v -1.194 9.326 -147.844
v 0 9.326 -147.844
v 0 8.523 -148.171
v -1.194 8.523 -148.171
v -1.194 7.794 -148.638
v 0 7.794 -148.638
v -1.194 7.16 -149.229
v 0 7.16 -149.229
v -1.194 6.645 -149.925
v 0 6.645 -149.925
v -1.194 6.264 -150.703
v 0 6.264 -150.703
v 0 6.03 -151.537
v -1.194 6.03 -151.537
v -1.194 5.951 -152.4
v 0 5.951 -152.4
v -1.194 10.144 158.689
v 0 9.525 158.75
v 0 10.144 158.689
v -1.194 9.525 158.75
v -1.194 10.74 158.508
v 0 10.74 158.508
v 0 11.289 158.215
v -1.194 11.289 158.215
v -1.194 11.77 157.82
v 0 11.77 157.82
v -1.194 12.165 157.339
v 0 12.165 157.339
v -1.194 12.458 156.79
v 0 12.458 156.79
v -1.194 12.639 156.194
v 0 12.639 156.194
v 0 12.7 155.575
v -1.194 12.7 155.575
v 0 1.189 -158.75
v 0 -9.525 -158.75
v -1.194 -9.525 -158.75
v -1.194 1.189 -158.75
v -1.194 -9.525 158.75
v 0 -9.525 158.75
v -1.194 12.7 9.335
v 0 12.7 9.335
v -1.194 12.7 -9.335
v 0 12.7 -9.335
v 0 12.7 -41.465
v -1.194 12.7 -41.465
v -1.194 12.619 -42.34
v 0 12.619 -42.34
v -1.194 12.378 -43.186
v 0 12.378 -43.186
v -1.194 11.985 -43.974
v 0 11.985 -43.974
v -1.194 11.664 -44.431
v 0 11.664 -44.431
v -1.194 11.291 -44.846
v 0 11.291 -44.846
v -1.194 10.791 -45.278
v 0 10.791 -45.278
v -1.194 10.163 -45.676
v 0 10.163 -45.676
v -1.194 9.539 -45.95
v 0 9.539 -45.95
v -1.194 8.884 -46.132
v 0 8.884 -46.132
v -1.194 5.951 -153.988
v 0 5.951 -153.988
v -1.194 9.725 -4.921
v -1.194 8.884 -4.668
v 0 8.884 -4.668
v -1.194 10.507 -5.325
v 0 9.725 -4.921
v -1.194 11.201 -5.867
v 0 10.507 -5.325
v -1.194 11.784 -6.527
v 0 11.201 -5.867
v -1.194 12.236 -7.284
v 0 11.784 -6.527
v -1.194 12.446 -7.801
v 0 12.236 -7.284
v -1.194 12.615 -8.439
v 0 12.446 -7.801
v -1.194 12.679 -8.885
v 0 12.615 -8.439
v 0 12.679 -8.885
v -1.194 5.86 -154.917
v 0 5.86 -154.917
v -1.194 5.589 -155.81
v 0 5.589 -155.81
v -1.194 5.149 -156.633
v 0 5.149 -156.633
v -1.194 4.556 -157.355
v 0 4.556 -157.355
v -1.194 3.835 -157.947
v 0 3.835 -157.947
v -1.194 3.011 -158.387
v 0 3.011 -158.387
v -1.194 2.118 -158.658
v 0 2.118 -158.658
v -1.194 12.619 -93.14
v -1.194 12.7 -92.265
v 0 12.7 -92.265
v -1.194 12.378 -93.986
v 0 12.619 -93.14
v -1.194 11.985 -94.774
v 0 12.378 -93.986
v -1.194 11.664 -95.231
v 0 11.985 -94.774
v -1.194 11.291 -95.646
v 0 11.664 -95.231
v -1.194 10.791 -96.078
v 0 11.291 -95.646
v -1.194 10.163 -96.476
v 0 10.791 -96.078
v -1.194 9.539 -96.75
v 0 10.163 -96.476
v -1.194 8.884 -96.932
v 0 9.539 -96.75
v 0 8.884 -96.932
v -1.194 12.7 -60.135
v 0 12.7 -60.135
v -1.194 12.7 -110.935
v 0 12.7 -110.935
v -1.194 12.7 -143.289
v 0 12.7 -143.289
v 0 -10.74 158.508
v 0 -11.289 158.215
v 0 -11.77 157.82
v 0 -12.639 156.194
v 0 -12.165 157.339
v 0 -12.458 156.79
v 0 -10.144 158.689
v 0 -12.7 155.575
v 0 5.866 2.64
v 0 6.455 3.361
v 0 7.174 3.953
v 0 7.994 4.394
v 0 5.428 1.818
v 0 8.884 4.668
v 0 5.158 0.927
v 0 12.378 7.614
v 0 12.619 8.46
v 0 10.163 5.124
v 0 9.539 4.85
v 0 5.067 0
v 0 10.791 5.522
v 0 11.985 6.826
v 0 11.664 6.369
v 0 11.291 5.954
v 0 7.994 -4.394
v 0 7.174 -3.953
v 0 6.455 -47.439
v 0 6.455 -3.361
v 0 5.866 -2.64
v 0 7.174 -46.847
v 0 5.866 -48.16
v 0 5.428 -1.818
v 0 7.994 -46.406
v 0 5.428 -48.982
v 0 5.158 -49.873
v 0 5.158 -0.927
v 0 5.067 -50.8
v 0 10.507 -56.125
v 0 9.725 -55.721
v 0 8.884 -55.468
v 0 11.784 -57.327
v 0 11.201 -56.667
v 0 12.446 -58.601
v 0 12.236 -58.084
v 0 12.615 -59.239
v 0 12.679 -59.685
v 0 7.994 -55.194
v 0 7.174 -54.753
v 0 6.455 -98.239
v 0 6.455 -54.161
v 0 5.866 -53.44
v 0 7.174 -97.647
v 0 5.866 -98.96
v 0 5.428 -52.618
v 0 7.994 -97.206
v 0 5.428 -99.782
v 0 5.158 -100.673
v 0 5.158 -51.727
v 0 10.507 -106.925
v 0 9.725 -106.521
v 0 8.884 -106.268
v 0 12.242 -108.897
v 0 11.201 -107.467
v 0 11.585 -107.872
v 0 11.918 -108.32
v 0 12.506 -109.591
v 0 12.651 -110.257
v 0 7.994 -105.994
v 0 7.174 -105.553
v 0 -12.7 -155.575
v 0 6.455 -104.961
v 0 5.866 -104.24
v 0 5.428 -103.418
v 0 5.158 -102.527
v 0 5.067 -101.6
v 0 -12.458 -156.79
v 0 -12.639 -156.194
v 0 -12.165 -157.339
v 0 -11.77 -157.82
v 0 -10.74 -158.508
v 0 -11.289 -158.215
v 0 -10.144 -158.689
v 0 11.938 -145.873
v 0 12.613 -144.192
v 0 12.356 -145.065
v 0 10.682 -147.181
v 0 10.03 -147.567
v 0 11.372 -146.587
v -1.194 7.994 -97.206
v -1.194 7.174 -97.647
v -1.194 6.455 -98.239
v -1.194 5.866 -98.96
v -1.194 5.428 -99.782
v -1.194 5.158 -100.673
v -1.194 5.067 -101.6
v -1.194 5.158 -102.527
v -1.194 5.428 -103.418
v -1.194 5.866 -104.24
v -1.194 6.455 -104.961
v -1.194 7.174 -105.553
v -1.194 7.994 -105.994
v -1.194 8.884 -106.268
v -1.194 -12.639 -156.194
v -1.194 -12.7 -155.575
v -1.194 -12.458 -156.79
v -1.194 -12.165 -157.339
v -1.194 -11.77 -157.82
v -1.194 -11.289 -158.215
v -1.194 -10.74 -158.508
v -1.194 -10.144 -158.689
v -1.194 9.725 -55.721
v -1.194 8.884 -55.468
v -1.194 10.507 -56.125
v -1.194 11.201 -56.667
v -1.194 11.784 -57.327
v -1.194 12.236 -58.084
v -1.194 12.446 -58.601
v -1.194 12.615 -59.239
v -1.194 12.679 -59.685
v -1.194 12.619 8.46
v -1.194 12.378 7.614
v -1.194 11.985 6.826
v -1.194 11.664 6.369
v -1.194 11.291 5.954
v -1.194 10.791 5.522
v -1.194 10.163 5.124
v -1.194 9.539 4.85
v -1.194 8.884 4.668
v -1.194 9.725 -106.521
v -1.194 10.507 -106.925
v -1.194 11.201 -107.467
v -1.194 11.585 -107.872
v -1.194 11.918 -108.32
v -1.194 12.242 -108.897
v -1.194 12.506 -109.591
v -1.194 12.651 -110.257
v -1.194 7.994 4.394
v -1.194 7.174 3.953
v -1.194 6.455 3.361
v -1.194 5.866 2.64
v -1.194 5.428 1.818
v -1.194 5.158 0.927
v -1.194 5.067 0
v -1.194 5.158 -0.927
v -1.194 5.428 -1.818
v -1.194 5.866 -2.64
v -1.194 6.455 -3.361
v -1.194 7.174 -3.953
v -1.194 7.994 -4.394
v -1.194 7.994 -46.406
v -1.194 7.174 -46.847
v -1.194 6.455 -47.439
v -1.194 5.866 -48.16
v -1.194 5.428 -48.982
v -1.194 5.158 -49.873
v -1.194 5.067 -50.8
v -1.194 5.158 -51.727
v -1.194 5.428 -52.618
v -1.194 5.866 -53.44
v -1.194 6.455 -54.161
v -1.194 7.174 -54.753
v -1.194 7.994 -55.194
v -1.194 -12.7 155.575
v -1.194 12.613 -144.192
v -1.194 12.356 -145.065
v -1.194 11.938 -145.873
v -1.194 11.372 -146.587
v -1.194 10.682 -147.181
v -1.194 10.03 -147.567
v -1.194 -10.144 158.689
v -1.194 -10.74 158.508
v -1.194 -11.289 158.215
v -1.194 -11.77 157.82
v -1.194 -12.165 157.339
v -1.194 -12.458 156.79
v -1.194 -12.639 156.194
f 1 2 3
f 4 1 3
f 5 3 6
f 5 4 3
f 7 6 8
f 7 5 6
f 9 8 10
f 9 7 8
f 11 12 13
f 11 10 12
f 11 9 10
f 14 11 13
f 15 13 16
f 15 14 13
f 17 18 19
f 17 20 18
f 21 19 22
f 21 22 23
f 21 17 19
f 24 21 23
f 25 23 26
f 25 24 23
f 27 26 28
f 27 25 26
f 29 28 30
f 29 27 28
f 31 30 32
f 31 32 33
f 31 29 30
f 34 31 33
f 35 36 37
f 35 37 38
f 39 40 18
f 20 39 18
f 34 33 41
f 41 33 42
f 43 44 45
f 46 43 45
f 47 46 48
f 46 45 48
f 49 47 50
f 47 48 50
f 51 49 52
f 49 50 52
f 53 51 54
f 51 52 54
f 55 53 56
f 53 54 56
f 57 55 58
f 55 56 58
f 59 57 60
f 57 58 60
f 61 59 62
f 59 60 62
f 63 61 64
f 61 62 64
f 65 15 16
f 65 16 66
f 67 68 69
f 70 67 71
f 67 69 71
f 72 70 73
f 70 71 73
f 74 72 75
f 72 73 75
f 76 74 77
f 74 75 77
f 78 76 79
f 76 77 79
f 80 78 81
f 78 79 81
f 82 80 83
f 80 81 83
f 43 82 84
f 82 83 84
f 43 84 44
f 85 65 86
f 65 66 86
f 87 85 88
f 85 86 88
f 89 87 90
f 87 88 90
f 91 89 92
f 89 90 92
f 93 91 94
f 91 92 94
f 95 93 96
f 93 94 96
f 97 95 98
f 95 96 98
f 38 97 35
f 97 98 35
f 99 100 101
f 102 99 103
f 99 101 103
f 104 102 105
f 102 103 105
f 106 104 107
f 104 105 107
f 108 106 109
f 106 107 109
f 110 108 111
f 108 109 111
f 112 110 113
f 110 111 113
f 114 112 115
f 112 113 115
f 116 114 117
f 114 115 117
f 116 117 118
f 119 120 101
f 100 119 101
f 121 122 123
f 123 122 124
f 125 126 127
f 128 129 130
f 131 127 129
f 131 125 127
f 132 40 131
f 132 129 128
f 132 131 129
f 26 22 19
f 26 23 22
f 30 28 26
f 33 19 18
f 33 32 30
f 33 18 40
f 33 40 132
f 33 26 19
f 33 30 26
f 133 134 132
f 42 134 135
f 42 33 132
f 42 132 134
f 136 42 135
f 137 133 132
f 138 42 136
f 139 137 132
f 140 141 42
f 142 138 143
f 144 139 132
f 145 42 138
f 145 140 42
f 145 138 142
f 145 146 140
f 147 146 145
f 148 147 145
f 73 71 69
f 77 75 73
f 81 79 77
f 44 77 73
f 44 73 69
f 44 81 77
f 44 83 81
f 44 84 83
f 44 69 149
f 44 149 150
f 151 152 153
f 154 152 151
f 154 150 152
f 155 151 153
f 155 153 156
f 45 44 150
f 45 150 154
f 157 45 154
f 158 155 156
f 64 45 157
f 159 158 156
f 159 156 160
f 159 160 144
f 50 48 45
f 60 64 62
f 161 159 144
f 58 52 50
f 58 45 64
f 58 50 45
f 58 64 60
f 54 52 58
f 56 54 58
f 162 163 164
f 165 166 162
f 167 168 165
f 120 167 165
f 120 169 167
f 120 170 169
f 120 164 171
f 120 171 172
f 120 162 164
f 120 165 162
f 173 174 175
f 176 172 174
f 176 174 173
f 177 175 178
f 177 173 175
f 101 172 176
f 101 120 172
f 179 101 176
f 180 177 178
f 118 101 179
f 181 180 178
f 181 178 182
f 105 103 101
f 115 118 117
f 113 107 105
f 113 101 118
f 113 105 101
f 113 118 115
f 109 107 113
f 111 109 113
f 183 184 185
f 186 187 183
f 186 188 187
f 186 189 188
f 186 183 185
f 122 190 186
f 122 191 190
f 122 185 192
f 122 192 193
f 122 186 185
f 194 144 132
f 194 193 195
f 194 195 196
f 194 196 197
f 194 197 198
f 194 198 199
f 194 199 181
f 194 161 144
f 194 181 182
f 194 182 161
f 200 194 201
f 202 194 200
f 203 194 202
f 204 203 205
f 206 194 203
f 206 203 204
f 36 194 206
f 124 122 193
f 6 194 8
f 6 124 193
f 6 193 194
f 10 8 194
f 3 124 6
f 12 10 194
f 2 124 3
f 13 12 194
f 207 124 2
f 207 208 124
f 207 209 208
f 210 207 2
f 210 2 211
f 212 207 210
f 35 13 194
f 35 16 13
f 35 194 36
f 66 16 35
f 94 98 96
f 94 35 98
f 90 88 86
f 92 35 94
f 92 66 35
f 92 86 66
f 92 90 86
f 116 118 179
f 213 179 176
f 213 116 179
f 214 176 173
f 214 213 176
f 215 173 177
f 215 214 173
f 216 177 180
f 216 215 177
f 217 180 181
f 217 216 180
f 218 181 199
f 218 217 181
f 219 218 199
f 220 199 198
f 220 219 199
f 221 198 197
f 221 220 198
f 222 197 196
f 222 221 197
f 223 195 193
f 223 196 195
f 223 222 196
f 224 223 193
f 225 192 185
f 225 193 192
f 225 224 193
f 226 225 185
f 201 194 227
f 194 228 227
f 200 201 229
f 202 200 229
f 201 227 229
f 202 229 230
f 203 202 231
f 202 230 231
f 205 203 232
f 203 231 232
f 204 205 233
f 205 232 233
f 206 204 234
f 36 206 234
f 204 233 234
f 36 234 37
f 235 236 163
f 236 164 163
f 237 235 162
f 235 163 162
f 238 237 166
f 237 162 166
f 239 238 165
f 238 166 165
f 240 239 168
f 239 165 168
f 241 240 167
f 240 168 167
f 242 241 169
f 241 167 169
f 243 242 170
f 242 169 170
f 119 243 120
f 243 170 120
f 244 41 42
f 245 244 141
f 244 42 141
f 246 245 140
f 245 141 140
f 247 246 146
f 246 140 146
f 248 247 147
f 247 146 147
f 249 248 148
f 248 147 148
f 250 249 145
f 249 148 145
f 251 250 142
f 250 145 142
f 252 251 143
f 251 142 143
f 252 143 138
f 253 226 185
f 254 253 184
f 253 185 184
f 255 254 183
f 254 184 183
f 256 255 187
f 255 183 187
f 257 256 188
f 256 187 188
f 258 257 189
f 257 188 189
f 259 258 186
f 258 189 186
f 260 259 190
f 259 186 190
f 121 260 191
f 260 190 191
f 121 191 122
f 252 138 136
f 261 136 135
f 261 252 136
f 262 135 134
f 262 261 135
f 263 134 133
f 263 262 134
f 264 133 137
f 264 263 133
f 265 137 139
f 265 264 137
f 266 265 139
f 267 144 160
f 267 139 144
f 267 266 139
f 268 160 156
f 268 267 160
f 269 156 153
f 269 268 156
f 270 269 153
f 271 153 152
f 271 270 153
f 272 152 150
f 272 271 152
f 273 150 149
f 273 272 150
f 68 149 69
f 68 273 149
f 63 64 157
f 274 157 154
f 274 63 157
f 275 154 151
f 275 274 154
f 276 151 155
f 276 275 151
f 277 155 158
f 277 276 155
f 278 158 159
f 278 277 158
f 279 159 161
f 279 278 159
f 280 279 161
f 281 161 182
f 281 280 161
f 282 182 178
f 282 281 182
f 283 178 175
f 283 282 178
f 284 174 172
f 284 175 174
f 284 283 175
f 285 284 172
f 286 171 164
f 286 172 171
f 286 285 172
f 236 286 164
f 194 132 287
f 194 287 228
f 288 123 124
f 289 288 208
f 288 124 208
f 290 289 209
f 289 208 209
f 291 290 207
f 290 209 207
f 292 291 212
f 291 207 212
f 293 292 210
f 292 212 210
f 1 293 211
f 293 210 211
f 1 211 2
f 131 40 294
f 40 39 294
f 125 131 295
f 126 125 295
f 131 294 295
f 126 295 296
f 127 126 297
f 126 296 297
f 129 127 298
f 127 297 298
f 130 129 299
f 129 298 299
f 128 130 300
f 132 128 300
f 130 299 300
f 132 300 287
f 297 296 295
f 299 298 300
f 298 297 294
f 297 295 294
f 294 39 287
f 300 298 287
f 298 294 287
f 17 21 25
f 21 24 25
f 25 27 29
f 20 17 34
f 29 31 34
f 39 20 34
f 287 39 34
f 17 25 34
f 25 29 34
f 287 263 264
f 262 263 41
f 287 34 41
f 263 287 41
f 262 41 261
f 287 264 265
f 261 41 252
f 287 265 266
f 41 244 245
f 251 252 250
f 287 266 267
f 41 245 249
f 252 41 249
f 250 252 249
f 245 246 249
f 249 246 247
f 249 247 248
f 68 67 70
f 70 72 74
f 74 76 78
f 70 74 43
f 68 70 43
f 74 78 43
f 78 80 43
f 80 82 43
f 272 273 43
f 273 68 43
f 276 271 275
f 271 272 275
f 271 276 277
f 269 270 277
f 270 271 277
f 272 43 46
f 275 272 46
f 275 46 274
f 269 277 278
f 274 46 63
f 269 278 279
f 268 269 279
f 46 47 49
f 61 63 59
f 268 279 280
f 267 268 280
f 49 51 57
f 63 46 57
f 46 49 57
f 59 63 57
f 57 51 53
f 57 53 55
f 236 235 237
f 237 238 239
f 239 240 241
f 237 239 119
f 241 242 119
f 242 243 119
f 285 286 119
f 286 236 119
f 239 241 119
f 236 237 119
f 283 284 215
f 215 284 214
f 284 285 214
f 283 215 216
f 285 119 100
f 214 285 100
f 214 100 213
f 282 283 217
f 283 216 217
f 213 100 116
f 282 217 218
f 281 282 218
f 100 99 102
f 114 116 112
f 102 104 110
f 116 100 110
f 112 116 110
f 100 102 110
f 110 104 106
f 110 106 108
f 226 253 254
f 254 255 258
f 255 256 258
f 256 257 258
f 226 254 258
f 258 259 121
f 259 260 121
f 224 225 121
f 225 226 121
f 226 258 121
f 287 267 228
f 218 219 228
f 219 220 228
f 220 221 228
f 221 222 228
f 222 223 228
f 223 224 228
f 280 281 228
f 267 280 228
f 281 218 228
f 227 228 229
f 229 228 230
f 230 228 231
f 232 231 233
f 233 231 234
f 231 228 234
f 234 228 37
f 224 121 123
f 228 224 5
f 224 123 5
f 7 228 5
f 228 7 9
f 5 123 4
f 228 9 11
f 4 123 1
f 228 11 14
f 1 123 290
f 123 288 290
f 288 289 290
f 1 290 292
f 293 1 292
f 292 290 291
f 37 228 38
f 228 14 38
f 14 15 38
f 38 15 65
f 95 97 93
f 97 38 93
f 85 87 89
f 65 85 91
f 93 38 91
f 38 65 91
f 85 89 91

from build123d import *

# Parameters (mm, degrees)
SKETCH1_W              = 317.5
SKETCH1_H              = 25.4
BASE_FLANGE1_DEPTH     = 1.1938
FILLET1_R              = 3.175
CUT_EXTRUDE1_DEPTH     = 160.261664121
FILLET2_R              = 4.7625
LPATTERN2_COUNT        = 3
LPATTERN2_PITCH        = 50.8
FILLET2_OF_LPATTERN2_R = 4.7625
CUT_EXTRUDE2_DEPTH     = 160.261664229
FILLET3_R              = 4.7625


# Sheet-metal steps are written as plain solids
with BuildPart() as part:
    # Sketch1 → Base-Flange1 (new body)
    with BuildSketch(Plane(origin=(0, 0, 0), x_dir=(0, 0, -1), z_dir=(1, 0, 0))):
        Rectangle(SKETCH1_W, SKETCH1_H)
    extrude(amount=-BASE_FLANGE1_DEPTH)

    # Fillet1
    fillet1_edges = [part.edges().sort_by_distance(p)[0] for p in [
        (-0.5969, -12.7, -158.75),
        (-0.5969, -12.7, 158.75),
        (-0.5969, 12.7, 158.75),
        (-0.5969, 12.7, -158.75),
    ]]
    fillet(fillet1_edges, radius=FILLET1_R)

    # Sketch2 → Cut-Extrude1 (cut, through all)
    with BuildSketch(Plane.ZY.offset(1.1938)):
        with BuildLine():
            Line((-4.7625, 9.8298), (-4.7625, 12.7))
            Line((-4.7625, 12.7), (4.7625, 12.7))
            Line((4.7625, 12.7), (4.7625, 9.8298))
            ThreePointArc((4.7625, 9.8298), (0, 5.0673), (-4.7625, 9.8298))
        make_face()
    cut_extrude1 = extrude(amount=-CUT_EXTRUDE1_DEPTH, mode=Mode.SUBTRACT)

    # Fillet2
    fillet2_edges = [part.edges().sort_by_distance(p)[0] for p in [
        (-0.5969, 12.7, 4.7625),
        (-0.5969, 12.7, -4.7625),
    ]]
    fillet(fillet2_edges, radius=FILLET2_R)

    # LPattern2: Cut-Extrude1 ×3
    with Locations(*[(0, 0, -i * LPATTERN2_PITCH) for i in range(1, LPATTERN2_COUNT)]):
        add(cut_extrude1, mode=Mode.SUBTRACT)

    # Fillet2 of LPattern2
    fillet2_of_lpattern2_edges = [part.edges().sort_by_distance(p)[0] for p in [
        (-0.5969, 12.7, -46.0375),
        (-0.5969, 12.7, -55.5625),
        (-0.5969, 12.7, -96.8375),
        (-0.5969, 12.7, -106.3625),
    ]]
    fillet(fillet2_of_lpattern2_edges, radius=FILLET2_OF_LPATTERN2_R)

    # Sketch3 → Cut-Extrude2 (cut, through all)
    with BuildSketch(Plane.ZY.offset(1.1938)):
        with BuildLine():
            Line((-152.4, 5.951169638), (-158.75, 5.951169638))
            Line((-158.75, 5.951169638), (-158.75, 9.525))
            ThreePointArc((-158.75, 9.525), (-157.82006403, 11.77006403), (-155.575, 12.7))
            Line((-155.575, 12.7), (-147.6375, 12.7))
            Line((-147.6375, 12.7), (-147.6375, 10.713669638))
            ThreePointArc((-147.6375, 10.713669638), (-149.032403955, 7.346073593), (-152.4, 5.951169638))
        make_face()
    extrude(amount=-CUT_EXTRUDE2_DEPTH, mode=Mode.SUBTRACT)

    # Fillet3
    fillet3_edges = [part.edges().sort_by_distance(p)[0] for p in [
        (-0.5969, 5.951169638, -158.75),
        (-0.5969, 12.7, -147.6375),
    ]]
    fillet(fillet3_edges, radius=FILLET3_R)


solid = part.part
